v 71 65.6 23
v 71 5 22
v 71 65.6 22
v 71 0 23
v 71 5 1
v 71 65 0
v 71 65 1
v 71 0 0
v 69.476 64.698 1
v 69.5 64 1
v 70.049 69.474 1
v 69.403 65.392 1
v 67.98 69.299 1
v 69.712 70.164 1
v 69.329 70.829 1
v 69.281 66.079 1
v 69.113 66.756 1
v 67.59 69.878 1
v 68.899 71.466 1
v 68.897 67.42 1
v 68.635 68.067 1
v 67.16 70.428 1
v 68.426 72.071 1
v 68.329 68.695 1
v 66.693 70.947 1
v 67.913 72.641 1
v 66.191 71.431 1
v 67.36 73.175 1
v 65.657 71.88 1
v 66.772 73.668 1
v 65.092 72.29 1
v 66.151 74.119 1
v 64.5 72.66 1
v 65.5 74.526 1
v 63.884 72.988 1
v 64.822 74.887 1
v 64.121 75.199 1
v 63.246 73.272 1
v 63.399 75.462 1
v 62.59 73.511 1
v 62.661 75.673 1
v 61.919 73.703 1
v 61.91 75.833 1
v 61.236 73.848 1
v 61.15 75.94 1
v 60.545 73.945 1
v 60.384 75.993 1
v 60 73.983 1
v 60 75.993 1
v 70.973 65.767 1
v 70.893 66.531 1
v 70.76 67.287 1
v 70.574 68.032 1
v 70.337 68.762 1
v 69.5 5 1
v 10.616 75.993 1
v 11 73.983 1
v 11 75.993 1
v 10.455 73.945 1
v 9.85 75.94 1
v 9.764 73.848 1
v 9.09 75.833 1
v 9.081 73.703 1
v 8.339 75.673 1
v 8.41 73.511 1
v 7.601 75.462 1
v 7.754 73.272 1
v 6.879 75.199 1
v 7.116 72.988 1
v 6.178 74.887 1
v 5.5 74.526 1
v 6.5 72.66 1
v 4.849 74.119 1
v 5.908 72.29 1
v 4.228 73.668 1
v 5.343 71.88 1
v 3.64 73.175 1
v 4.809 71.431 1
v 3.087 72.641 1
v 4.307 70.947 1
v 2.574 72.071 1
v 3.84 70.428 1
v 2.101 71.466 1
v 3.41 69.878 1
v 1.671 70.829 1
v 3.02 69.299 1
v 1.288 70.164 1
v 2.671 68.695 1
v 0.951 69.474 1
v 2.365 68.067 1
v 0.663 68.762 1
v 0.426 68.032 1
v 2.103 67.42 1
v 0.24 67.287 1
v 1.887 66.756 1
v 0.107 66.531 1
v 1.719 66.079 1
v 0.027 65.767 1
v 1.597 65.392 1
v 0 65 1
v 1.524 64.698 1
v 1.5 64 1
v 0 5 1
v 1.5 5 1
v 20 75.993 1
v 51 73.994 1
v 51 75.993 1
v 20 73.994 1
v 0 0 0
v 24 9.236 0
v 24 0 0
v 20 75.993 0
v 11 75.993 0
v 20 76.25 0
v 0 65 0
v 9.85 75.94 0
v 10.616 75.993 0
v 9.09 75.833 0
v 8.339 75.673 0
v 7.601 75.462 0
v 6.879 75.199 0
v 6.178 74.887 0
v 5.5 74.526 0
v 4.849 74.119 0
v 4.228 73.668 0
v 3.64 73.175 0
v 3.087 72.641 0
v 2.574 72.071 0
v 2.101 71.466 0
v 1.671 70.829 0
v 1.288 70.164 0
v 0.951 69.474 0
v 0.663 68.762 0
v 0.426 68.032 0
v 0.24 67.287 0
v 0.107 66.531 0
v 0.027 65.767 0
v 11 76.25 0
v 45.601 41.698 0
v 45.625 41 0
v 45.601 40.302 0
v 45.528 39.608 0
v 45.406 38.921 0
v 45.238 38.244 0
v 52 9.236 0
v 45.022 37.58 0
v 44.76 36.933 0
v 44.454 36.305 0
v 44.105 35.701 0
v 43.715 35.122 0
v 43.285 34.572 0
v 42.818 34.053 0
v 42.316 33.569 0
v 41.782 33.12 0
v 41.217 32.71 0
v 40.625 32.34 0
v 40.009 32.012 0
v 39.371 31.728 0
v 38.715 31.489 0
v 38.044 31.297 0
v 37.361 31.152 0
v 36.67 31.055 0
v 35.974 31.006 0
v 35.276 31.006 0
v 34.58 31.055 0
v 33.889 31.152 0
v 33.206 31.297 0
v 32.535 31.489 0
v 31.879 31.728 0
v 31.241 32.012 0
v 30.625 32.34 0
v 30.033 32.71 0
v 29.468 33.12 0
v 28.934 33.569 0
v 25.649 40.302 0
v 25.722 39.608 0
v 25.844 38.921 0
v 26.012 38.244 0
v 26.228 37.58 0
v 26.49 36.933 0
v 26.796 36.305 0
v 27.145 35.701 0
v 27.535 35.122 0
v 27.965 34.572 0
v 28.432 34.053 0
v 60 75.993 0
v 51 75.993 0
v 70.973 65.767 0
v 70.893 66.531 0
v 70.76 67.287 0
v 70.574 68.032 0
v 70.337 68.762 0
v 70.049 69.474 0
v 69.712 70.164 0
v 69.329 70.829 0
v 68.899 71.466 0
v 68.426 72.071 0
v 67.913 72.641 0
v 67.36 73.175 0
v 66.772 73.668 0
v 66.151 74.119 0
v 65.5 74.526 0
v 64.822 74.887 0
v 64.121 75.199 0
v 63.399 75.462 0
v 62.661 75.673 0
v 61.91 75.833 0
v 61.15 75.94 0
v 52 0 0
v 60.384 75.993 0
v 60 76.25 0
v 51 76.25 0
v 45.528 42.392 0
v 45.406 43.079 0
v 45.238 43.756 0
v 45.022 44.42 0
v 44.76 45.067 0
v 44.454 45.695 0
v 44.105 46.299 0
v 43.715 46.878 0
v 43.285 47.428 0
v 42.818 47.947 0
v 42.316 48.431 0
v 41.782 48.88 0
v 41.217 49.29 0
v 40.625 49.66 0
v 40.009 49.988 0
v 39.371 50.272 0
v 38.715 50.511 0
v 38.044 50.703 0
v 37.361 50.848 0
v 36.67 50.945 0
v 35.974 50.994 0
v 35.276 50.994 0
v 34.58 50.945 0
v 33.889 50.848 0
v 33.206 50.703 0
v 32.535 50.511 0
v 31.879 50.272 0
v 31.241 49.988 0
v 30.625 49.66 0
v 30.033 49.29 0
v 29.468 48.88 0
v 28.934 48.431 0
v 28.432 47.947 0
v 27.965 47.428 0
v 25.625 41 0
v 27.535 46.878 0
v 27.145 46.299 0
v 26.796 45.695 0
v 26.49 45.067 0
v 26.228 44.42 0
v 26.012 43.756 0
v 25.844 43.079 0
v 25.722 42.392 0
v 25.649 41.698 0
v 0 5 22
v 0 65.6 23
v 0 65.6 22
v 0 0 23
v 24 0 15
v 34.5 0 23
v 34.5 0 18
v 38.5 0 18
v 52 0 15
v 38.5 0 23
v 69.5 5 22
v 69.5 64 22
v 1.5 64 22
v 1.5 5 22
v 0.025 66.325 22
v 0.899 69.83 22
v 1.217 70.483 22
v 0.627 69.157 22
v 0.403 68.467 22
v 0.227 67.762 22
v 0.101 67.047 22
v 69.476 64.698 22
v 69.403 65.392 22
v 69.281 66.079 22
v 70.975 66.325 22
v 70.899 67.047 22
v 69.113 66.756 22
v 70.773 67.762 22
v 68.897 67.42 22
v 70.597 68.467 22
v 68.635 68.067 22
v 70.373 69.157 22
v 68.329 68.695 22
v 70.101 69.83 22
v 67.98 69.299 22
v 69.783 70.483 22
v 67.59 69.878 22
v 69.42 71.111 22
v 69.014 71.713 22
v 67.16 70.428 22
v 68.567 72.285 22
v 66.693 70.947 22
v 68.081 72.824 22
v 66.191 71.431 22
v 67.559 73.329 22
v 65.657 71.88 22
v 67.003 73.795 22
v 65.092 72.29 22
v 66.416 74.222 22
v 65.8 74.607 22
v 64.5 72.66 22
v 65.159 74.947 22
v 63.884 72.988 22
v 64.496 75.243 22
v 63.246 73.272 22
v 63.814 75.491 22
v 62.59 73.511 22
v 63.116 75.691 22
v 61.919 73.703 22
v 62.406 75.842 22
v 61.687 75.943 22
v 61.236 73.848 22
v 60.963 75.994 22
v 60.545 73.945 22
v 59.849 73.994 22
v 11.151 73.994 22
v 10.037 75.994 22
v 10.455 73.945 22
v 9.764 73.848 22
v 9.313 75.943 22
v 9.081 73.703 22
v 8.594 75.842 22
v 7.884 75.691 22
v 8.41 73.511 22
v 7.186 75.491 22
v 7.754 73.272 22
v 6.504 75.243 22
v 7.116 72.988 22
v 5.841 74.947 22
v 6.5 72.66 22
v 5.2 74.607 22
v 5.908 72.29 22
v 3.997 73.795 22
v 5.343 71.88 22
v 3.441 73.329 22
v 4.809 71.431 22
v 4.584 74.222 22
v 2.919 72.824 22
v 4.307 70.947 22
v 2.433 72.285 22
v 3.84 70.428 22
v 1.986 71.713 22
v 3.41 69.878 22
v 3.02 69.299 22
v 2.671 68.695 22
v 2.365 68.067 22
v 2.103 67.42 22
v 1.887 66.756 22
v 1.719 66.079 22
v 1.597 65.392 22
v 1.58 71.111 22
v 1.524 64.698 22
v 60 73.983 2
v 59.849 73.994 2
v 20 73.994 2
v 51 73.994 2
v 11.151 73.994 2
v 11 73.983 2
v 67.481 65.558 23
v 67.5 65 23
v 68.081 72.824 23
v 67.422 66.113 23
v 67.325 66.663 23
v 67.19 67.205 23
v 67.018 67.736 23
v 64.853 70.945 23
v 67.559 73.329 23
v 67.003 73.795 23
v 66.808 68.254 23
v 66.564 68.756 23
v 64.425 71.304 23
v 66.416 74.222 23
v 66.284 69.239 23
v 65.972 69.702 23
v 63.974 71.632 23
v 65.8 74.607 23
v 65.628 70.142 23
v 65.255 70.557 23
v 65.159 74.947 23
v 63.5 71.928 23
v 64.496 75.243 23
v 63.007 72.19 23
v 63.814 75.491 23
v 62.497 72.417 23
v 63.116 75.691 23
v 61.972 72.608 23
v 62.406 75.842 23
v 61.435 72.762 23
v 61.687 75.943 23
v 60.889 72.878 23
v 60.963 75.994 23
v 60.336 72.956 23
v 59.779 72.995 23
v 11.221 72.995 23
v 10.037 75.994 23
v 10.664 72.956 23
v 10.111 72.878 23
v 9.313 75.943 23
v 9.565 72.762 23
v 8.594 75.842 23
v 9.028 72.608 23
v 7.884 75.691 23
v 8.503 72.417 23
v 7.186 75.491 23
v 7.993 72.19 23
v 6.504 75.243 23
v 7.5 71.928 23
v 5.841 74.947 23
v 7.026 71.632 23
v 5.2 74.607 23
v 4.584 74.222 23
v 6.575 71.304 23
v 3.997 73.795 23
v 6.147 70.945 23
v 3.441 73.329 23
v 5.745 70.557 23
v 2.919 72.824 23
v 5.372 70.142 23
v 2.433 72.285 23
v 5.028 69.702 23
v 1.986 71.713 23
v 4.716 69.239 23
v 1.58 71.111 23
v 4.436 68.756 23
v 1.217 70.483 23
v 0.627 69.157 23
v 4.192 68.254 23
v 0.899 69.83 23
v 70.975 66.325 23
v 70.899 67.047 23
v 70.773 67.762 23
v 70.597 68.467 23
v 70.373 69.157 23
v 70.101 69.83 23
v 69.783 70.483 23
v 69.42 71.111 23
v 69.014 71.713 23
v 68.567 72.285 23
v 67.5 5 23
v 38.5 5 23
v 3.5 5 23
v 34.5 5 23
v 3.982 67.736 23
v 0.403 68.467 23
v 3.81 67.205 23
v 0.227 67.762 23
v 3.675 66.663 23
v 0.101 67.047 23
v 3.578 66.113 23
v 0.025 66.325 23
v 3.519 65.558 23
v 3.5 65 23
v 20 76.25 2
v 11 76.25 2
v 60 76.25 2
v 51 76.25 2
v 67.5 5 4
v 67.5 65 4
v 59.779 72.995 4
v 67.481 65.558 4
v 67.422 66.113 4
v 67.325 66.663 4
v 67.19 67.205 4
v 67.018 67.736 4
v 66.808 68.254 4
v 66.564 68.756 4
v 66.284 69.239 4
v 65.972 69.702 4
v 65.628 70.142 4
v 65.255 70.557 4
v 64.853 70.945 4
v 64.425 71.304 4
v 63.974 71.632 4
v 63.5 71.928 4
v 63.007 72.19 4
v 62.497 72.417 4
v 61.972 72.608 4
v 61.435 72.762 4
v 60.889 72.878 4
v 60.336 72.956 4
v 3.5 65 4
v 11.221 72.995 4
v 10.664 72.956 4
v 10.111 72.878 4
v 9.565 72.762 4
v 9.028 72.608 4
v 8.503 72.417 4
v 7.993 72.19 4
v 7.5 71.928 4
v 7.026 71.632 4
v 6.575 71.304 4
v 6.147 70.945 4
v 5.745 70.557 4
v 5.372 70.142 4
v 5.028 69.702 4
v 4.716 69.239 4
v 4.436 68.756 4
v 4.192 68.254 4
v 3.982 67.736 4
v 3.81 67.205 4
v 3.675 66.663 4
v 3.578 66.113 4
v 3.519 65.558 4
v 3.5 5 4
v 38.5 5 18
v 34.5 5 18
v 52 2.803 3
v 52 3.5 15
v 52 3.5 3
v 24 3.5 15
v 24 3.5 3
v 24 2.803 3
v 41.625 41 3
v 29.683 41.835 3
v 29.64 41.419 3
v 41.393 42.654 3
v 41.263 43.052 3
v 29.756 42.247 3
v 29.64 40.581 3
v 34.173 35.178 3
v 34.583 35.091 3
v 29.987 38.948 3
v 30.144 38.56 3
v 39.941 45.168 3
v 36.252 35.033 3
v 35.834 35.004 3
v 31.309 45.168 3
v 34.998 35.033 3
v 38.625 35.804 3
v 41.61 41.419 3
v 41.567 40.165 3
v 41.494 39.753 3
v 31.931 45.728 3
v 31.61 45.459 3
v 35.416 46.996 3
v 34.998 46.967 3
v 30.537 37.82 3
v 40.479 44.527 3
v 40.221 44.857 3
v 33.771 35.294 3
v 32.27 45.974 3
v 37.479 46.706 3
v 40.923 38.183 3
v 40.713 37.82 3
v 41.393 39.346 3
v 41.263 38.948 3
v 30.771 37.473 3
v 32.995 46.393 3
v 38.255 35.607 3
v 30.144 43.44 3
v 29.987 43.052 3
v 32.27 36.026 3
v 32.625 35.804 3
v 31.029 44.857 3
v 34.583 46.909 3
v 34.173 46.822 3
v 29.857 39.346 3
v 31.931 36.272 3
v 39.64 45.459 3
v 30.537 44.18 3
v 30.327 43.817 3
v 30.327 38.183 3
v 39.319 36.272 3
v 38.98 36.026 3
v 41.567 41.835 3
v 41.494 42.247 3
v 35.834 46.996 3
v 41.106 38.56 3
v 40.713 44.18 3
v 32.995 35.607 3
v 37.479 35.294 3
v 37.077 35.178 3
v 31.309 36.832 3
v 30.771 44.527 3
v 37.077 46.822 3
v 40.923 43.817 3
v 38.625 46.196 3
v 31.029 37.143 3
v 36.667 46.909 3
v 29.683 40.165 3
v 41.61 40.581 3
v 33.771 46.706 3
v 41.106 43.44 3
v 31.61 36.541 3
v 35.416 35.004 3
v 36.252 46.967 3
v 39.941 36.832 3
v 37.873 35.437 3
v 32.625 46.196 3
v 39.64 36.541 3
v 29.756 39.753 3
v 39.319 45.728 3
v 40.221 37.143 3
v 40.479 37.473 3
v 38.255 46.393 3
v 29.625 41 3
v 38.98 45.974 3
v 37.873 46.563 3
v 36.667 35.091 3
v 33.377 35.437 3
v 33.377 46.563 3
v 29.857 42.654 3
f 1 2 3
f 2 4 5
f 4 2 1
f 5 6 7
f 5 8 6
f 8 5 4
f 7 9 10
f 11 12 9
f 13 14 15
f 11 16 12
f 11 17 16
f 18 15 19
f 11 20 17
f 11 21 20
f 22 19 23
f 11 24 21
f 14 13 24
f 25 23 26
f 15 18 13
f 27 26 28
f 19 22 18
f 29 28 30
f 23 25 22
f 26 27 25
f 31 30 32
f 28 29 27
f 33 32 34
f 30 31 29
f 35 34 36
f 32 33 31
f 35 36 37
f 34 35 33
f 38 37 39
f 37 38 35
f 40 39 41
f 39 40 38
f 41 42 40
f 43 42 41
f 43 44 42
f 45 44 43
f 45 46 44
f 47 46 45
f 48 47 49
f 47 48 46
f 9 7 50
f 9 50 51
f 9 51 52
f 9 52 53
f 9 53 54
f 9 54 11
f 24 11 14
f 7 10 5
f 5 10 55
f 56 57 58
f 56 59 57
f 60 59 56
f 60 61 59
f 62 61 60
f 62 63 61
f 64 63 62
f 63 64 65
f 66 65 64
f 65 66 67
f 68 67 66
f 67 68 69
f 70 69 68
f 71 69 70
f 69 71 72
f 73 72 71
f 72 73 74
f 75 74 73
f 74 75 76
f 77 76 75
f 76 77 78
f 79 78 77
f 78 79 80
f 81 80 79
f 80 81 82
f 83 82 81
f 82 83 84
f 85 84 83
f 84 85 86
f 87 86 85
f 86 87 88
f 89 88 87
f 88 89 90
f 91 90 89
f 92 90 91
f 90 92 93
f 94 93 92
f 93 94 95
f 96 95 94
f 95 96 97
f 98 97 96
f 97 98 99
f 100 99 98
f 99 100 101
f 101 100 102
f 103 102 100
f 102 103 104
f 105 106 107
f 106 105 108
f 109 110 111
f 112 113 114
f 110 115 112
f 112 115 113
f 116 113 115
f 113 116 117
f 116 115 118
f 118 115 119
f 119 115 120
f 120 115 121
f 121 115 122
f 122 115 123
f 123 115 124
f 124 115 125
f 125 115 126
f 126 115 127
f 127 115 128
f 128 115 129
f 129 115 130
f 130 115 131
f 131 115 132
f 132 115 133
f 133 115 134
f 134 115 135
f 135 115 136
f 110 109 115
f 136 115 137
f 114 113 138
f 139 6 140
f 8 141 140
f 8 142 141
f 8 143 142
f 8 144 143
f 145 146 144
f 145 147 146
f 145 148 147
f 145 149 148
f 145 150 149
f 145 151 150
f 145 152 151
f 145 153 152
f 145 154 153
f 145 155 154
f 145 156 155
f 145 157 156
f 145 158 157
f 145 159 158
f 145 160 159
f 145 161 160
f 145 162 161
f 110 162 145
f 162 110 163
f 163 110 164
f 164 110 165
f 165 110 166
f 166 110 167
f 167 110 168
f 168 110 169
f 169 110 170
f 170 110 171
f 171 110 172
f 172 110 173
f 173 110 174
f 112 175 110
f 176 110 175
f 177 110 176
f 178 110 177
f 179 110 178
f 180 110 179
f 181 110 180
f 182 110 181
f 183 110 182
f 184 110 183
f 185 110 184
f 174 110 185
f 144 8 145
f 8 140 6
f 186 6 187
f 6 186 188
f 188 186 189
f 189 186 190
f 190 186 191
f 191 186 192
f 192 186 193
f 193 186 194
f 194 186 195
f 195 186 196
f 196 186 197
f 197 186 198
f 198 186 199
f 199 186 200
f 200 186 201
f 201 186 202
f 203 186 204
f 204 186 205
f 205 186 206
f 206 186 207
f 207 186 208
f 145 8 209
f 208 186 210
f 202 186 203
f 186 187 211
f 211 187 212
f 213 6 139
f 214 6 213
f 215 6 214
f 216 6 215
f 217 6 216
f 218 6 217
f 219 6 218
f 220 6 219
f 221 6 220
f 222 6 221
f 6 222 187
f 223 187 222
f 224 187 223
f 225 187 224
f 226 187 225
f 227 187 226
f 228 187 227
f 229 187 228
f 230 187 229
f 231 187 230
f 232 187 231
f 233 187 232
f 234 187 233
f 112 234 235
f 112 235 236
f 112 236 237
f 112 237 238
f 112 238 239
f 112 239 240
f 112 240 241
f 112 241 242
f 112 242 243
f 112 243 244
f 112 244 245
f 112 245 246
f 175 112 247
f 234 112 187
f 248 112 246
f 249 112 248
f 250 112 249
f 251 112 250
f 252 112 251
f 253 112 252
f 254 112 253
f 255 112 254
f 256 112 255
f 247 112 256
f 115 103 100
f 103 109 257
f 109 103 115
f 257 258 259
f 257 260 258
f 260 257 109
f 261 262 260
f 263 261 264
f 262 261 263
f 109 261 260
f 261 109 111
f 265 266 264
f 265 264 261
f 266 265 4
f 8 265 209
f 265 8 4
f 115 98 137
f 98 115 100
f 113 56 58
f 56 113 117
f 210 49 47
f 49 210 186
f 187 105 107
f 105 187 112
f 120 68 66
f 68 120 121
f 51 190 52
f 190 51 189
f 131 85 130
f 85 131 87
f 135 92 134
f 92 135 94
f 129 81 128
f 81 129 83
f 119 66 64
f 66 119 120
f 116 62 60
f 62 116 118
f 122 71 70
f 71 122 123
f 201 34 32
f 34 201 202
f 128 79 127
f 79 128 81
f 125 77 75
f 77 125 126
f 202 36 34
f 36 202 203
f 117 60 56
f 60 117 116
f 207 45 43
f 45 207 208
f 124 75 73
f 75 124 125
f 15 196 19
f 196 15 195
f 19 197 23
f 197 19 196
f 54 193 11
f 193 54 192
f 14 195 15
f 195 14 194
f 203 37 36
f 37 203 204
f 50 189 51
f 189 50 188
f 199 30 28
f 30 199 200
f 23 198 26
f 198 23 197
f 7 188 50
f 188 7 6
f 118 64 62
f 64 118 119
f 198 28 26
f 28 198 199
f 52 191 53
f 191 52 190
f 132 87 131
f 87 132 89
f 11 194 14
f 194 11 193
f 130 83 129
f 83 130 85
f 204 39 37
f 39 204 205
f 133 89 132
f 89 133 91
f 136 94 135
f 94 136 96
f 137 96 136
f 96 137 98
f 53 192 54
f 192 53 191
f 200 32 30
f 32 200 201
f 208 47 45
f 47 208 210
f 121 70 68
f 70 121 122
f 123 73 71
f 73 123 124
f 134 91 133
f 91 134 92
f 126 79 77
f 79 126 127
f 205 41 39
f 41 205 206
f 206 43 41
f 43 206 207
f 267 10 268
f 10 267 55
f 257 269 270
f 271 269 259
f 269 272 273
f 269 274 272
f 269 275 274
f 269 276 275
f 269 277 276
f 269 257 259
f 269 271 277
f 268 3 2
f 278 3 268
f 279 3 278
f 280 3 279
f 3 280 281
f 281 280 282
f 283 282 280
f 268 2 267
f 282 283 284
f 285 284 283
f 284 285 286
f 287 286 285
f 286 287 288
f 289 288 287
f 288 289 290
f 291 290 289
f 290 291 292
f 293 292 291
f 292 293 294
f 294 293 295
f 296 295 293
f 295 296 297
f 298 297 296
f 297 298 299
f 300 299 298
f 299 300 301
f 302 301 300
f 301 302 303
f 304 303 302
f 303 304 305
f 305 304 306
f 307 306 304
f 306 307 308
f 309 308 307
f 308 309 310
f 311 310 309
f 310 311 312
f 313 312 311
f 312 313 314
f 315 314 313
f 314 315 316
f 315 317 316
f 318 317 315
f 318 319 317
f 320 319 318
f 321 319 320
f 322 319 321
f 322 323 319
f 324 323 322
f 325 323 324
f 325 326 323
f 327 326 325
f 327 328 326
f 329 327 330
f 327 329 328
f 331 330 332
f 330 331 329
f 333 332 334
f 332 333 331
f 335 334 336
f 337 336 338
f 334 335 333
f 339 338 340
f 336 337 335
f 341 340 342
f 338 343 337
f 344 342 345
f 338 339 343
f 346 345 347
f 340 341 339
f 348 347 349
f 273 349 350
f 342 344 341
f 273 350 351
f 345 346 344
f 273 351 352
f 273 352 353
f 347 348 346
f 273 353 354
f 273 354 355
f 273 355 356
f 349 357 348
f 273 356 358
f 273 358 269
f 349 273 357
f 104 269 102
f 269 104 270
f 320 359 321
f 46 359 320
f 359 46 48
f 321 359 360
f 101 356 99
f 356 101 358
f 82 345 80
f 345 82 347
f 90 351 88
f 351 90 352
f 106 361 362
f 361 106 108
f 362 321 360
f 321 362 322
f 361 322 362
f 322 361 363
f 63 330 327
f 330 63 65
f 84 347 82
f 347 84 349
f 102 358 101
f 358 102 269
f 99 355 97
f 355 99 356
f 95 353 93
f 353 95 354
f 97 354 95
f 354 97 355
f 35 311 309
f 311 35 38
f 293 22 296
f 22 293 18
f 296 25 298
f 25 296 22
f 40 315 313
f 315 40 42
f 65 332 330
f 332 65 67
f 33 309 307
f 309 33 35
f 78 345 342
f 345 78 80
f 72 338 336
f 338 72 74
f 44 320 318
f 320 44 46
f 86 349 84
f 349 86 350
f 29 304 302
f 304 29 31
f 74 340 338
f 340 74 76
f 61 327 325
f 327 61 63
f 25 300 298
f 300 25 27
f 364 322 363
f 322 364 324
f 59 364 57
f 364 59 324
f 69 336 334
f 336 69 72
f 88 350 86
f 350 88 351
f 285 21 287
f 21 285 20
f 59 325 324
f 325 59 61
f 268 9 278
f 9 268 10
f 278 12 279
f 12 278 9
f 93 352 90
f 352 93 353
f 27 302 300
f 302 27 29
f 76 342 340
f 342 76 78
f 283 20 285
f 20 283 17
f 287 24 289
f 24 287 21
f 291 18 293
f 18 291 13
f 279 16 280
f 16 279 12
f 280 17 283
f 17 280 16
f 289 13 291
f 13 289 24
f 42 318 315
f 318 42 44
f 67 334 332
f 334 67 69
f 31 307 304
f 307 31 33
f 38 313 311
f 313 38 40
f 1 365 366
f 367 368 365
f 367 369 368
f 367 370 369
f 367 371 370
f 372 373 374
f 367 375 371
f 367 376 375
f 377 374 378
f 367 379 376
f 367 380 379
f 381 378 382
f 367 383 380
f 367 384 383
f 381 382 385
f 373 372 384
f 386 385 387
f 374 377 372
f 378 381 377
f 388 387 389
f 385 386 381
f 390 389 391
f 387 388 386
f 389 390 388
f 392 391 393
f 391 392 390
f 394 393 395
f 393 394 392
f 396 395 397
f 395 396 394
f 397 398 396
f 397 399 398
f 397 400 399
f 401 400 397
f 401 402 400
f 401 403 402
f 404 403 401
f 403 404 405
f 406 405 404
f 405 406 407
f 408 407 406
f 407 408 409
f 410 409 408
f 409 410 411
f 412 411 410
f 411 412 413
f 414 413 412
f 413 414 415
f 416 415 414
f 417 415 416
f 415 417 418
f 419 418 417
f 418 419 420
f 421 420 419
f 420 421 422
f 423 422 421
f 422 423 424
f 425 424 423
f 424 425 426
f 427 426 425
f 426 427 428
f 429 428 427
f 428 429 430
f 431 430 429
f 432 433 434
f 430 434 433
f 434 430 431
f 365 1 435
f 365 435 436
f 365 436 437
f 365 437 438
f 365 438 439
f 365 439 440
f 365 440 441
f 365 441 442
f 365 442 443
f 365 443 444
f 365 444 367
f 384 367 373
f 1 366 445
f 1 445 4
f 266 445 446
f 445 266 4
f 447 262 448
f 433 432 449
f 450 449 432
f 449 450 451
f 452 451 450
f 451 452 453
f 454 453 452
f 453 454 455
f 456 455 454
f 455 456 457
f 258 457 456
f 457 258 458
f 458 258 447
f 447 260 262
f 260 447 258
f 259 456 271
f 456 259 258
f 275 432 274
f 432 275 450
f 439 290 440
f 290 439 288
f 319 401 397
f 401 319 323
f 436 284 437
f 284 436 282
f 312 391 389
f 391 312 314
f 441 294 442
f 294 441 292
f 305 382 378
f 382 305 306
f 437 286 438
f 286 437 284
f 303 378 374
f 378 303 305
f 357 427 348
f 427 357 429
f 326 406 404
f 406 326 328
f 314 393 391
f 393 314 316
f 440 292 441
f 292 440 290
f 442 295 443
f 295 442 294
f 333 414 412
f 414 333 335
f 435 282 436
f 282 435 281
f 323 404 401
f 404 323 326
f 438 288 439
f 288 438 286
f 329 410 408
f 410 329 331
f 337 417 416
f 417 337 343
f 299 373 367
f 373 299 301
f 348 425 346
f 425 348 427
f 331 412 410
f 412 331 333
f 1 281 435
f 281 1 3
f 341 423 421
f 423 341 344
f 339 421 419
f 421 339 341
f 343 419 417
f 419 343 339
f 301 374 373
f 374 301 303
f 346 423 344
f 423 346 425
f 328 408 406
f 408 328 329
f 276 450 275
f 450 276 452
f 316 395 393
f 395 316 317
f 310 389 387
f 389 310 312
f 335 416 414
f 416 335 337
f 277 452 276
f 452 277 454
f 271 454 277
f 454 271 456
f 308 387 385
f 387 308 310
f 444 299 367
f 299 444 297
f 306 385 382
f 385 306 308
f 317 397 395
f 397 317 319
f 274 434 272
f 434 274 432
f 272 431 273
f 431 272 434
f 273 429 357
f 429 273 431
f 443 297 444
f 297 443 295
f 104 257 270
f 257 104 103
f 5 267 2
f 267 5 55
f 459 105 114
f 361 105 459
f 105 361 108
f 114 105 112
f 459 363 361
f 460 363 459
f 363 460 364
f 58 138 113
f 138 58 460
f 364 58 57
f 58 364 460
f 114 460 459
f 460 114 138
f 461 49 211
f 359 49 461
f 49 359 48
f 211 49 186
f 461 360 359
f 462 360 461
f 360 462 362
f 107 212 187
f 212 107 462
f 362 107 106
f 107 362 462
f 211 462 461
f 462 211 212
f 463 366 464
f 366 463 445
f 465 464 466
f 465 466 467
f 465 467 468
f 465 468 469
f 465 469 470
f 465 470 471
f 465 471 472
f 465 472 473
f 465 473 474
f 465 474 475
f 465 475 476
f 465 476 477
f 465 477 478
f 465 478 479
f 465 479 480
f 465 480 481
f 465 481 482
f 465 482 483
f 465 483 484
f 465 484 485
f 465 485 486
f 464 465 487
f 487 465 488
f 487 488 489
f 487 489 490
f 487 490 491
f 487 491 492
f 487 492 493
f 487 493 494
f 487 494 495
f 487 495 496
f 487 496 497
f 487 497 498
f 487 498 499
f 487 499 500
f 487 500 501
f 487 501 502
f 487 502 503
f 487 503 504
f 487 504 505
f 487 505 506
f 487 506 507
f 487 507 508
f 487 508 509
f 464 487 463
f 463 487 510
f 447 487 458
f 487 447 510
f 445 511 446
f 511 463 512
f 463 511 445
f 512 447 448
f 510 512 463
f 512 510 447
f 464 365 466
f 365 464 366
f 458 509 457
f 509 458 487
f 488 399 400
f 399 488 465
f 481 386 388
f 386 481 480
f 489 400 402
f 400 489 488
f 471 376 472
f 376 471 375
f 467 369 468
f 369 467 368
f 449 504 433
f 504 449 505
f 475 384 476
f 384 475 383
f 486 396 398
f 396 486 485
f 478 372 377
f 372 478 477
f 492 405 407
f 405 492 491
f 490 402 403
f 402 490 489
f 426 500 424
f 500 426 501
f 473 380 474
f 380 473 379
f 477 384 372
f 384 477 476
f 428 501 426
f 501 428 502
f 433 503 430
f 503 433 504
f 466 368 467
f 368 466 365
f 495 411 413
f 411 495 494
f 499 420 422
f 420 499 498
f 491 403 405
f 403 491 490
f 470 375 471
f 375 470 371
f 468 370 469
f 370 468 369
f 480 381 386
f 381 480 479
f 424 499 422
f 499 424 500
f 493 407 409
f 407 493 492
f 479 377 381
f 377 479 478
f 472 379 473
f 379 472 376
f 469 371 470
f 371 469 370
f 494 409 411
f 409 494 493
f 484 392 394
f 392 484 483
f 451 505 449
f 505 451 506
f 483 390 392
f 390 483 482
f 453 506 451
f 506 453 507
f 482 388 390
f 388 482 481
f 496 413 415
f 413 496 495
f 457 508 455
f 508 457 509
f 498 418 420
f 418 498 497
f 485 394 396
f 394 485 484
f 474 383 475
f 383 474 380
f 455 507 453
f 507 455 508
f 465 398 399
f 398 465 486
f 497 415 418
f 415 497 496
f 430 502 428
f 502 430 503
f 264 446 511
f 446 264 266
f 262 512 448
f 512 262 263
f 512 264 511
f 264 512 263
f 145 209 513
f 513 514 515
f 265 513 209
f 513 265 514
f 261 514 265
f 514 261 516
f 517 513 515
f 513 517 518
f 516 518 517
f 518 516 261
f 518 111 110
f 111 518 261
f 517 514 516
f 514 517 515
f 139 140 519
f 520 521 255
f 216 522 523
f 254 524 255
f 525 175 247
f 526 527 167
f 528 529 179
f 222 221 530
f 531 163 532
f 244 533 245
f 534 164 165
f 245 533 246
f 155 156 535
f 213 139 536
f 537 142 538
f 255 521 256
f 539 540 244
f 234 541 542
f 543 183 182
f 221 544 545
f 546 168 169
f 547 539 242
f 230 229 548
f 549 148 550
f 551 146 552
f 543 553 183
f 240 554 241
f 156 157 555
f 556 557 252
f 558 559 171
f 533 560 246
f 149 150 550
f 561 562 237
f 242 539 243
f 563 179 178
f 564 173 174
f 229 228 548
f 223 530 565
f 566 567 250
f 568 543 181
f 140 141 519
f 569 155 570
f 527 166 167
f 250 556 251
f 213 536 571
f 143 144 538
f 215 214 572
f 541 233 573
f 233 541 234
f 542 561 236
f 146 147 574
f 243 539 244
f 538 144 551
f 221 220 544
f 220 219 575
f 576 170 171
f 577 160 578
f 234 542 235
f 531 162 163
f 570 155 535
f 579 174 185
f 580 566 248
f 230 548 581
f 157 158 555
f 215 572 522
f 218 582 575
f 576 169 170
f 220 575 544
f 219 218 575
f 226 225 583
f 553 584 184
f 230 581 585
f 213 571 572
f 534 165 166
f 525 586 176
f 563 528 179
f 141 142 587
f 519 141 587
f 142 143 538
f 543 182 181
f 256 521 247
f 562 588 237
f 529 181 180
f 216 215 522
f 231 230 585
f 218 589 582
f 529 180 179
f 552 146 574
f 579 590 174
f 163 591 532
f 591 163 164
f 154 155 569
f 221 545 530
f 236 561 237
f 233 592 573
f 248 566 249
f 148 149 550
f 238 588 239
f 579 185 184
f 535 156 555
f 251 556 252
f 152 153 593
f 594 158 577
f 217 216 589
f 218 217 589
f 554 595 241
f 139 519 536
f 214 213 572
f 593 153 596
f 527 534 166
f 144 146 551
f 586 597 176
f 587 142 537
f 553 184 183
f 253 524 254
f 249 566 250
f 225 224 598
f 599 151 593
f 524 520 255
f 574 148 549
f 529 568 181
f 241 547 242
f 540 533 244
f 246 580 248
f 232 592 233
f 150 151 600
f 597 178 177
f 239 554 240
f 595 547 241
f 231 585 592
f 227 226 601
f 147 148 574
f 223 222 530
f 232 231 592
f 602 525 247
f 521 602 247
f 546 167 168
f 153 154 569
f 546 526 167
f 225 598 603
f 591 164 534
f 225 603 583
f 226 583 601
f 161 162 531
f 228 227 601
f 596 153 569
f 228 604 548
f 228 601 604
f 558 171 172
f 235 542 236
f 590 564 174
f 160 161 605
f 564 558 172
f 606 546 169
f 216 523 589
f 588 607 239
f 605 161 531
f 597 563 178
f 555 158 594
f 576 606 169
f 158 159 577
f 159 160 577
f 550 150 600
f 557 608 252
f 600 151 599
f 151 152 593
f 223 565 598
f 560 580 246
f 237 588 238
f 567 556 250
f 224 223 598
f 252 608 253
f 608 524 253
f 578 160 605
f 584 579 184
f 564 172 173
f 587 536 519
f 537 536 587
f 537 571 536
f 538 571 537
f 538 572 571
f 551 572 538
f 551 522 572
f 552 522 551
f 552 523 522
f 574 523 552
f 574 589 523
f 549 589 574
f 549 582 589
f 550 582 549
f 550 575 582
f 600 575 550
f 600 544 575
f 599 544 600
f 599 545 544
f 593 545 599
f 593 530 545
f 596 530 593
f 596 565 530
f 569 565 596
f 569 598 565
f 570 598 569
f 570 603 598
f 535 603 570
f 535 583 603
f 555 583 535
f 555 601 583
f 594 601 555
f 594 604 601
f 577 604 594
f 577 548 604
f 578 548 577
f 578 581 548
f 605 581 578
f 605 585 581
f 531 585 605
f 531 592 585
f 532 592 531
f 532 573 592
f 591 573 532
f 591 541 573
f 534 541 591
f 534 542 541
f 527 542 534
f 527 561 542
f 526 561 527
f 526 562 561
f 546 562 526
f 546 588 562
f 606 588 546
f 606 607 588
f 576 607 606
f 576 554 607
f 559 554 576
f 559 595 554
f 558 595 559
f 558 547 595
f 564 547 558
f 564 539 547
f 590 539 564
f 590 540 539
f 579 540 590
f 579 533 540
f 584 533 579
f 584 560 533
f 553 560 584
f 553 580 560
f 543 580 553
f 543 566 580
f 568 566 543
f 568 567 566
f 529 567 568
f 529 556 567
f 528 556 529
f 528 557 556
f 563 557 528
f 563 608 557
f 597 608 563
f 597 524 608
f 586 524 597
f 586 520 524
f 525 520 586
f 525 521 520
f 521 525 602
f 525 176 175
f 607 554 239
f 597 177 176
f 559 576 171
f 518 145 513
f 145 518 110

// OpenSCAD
/*

Blank Super 8 cartridge shell exterior
Jenny List 2022
CC-BY-SA 4.0

Front is across the X axis

*/

//outside profile of main part of the film cartridge
module SuperEightOutline(OutlineWidth=68,OutlineDepth=74,OutlineHeight=21,CornerRadius=10){
    cube([OutlineWidth,OutlineDepth-CornerRadius,OutlineHeight]);
    linear_extrude(OutlineHeight){
        hull() {
            translate([OutlineWidth-CornerRadius,OutlineDepth-CornerRadius,0]) circle(CornerRadius,$fn=90);
            translate([CornerRadius,OutlineDepth-CornerRadius,0]) circle(CornerRadius,$fn=90);
        }
    }
}

// Making a solid film cartridge with no hollowing out
module SuperEightShell(){
    //...from bottom to top
    SuperEightOutline(71,76,1,11); // Bottom of the cartridge
    translate([1.5,0,1]) SuperEightOutline();; //Main body of the shell
    translate([0,0,22]) SuperEightOutline(71,76,1,10.4); // Top of the cartridge.
    cube([71,5,23]); //Strengthen and thicken the front
    translate([11,73.25,00]) cube([9,3,2]); //left protrusion
    translate([51,73.25,00]) cube([9,3,2]); //right protrusion
}

// Hollowing out the bits to make a useful cartridge
module SuperEightCartridge(){
    difference() {
        SuperEightShell();
        translate([34.5,0,23]) rotate([-90,0,0]) cube([4,5,8]); // alignment pin 
        translate([38,1.75,9]) cube([28,3.5,12],true); // Where the film would go
        translate([35.625,41,0]) cylinder(3,10,6,$fn=90); //space for film winder to sit
        translate([24,9.2,-5.5]) rotate([65,0,0]) cube ([28,5,20]); //slide in
        translate([3.5,5,4]) SuperEightOutline(64,68,19,8); //Main cut-out inside
    }
}

SuperEightCartridge();
